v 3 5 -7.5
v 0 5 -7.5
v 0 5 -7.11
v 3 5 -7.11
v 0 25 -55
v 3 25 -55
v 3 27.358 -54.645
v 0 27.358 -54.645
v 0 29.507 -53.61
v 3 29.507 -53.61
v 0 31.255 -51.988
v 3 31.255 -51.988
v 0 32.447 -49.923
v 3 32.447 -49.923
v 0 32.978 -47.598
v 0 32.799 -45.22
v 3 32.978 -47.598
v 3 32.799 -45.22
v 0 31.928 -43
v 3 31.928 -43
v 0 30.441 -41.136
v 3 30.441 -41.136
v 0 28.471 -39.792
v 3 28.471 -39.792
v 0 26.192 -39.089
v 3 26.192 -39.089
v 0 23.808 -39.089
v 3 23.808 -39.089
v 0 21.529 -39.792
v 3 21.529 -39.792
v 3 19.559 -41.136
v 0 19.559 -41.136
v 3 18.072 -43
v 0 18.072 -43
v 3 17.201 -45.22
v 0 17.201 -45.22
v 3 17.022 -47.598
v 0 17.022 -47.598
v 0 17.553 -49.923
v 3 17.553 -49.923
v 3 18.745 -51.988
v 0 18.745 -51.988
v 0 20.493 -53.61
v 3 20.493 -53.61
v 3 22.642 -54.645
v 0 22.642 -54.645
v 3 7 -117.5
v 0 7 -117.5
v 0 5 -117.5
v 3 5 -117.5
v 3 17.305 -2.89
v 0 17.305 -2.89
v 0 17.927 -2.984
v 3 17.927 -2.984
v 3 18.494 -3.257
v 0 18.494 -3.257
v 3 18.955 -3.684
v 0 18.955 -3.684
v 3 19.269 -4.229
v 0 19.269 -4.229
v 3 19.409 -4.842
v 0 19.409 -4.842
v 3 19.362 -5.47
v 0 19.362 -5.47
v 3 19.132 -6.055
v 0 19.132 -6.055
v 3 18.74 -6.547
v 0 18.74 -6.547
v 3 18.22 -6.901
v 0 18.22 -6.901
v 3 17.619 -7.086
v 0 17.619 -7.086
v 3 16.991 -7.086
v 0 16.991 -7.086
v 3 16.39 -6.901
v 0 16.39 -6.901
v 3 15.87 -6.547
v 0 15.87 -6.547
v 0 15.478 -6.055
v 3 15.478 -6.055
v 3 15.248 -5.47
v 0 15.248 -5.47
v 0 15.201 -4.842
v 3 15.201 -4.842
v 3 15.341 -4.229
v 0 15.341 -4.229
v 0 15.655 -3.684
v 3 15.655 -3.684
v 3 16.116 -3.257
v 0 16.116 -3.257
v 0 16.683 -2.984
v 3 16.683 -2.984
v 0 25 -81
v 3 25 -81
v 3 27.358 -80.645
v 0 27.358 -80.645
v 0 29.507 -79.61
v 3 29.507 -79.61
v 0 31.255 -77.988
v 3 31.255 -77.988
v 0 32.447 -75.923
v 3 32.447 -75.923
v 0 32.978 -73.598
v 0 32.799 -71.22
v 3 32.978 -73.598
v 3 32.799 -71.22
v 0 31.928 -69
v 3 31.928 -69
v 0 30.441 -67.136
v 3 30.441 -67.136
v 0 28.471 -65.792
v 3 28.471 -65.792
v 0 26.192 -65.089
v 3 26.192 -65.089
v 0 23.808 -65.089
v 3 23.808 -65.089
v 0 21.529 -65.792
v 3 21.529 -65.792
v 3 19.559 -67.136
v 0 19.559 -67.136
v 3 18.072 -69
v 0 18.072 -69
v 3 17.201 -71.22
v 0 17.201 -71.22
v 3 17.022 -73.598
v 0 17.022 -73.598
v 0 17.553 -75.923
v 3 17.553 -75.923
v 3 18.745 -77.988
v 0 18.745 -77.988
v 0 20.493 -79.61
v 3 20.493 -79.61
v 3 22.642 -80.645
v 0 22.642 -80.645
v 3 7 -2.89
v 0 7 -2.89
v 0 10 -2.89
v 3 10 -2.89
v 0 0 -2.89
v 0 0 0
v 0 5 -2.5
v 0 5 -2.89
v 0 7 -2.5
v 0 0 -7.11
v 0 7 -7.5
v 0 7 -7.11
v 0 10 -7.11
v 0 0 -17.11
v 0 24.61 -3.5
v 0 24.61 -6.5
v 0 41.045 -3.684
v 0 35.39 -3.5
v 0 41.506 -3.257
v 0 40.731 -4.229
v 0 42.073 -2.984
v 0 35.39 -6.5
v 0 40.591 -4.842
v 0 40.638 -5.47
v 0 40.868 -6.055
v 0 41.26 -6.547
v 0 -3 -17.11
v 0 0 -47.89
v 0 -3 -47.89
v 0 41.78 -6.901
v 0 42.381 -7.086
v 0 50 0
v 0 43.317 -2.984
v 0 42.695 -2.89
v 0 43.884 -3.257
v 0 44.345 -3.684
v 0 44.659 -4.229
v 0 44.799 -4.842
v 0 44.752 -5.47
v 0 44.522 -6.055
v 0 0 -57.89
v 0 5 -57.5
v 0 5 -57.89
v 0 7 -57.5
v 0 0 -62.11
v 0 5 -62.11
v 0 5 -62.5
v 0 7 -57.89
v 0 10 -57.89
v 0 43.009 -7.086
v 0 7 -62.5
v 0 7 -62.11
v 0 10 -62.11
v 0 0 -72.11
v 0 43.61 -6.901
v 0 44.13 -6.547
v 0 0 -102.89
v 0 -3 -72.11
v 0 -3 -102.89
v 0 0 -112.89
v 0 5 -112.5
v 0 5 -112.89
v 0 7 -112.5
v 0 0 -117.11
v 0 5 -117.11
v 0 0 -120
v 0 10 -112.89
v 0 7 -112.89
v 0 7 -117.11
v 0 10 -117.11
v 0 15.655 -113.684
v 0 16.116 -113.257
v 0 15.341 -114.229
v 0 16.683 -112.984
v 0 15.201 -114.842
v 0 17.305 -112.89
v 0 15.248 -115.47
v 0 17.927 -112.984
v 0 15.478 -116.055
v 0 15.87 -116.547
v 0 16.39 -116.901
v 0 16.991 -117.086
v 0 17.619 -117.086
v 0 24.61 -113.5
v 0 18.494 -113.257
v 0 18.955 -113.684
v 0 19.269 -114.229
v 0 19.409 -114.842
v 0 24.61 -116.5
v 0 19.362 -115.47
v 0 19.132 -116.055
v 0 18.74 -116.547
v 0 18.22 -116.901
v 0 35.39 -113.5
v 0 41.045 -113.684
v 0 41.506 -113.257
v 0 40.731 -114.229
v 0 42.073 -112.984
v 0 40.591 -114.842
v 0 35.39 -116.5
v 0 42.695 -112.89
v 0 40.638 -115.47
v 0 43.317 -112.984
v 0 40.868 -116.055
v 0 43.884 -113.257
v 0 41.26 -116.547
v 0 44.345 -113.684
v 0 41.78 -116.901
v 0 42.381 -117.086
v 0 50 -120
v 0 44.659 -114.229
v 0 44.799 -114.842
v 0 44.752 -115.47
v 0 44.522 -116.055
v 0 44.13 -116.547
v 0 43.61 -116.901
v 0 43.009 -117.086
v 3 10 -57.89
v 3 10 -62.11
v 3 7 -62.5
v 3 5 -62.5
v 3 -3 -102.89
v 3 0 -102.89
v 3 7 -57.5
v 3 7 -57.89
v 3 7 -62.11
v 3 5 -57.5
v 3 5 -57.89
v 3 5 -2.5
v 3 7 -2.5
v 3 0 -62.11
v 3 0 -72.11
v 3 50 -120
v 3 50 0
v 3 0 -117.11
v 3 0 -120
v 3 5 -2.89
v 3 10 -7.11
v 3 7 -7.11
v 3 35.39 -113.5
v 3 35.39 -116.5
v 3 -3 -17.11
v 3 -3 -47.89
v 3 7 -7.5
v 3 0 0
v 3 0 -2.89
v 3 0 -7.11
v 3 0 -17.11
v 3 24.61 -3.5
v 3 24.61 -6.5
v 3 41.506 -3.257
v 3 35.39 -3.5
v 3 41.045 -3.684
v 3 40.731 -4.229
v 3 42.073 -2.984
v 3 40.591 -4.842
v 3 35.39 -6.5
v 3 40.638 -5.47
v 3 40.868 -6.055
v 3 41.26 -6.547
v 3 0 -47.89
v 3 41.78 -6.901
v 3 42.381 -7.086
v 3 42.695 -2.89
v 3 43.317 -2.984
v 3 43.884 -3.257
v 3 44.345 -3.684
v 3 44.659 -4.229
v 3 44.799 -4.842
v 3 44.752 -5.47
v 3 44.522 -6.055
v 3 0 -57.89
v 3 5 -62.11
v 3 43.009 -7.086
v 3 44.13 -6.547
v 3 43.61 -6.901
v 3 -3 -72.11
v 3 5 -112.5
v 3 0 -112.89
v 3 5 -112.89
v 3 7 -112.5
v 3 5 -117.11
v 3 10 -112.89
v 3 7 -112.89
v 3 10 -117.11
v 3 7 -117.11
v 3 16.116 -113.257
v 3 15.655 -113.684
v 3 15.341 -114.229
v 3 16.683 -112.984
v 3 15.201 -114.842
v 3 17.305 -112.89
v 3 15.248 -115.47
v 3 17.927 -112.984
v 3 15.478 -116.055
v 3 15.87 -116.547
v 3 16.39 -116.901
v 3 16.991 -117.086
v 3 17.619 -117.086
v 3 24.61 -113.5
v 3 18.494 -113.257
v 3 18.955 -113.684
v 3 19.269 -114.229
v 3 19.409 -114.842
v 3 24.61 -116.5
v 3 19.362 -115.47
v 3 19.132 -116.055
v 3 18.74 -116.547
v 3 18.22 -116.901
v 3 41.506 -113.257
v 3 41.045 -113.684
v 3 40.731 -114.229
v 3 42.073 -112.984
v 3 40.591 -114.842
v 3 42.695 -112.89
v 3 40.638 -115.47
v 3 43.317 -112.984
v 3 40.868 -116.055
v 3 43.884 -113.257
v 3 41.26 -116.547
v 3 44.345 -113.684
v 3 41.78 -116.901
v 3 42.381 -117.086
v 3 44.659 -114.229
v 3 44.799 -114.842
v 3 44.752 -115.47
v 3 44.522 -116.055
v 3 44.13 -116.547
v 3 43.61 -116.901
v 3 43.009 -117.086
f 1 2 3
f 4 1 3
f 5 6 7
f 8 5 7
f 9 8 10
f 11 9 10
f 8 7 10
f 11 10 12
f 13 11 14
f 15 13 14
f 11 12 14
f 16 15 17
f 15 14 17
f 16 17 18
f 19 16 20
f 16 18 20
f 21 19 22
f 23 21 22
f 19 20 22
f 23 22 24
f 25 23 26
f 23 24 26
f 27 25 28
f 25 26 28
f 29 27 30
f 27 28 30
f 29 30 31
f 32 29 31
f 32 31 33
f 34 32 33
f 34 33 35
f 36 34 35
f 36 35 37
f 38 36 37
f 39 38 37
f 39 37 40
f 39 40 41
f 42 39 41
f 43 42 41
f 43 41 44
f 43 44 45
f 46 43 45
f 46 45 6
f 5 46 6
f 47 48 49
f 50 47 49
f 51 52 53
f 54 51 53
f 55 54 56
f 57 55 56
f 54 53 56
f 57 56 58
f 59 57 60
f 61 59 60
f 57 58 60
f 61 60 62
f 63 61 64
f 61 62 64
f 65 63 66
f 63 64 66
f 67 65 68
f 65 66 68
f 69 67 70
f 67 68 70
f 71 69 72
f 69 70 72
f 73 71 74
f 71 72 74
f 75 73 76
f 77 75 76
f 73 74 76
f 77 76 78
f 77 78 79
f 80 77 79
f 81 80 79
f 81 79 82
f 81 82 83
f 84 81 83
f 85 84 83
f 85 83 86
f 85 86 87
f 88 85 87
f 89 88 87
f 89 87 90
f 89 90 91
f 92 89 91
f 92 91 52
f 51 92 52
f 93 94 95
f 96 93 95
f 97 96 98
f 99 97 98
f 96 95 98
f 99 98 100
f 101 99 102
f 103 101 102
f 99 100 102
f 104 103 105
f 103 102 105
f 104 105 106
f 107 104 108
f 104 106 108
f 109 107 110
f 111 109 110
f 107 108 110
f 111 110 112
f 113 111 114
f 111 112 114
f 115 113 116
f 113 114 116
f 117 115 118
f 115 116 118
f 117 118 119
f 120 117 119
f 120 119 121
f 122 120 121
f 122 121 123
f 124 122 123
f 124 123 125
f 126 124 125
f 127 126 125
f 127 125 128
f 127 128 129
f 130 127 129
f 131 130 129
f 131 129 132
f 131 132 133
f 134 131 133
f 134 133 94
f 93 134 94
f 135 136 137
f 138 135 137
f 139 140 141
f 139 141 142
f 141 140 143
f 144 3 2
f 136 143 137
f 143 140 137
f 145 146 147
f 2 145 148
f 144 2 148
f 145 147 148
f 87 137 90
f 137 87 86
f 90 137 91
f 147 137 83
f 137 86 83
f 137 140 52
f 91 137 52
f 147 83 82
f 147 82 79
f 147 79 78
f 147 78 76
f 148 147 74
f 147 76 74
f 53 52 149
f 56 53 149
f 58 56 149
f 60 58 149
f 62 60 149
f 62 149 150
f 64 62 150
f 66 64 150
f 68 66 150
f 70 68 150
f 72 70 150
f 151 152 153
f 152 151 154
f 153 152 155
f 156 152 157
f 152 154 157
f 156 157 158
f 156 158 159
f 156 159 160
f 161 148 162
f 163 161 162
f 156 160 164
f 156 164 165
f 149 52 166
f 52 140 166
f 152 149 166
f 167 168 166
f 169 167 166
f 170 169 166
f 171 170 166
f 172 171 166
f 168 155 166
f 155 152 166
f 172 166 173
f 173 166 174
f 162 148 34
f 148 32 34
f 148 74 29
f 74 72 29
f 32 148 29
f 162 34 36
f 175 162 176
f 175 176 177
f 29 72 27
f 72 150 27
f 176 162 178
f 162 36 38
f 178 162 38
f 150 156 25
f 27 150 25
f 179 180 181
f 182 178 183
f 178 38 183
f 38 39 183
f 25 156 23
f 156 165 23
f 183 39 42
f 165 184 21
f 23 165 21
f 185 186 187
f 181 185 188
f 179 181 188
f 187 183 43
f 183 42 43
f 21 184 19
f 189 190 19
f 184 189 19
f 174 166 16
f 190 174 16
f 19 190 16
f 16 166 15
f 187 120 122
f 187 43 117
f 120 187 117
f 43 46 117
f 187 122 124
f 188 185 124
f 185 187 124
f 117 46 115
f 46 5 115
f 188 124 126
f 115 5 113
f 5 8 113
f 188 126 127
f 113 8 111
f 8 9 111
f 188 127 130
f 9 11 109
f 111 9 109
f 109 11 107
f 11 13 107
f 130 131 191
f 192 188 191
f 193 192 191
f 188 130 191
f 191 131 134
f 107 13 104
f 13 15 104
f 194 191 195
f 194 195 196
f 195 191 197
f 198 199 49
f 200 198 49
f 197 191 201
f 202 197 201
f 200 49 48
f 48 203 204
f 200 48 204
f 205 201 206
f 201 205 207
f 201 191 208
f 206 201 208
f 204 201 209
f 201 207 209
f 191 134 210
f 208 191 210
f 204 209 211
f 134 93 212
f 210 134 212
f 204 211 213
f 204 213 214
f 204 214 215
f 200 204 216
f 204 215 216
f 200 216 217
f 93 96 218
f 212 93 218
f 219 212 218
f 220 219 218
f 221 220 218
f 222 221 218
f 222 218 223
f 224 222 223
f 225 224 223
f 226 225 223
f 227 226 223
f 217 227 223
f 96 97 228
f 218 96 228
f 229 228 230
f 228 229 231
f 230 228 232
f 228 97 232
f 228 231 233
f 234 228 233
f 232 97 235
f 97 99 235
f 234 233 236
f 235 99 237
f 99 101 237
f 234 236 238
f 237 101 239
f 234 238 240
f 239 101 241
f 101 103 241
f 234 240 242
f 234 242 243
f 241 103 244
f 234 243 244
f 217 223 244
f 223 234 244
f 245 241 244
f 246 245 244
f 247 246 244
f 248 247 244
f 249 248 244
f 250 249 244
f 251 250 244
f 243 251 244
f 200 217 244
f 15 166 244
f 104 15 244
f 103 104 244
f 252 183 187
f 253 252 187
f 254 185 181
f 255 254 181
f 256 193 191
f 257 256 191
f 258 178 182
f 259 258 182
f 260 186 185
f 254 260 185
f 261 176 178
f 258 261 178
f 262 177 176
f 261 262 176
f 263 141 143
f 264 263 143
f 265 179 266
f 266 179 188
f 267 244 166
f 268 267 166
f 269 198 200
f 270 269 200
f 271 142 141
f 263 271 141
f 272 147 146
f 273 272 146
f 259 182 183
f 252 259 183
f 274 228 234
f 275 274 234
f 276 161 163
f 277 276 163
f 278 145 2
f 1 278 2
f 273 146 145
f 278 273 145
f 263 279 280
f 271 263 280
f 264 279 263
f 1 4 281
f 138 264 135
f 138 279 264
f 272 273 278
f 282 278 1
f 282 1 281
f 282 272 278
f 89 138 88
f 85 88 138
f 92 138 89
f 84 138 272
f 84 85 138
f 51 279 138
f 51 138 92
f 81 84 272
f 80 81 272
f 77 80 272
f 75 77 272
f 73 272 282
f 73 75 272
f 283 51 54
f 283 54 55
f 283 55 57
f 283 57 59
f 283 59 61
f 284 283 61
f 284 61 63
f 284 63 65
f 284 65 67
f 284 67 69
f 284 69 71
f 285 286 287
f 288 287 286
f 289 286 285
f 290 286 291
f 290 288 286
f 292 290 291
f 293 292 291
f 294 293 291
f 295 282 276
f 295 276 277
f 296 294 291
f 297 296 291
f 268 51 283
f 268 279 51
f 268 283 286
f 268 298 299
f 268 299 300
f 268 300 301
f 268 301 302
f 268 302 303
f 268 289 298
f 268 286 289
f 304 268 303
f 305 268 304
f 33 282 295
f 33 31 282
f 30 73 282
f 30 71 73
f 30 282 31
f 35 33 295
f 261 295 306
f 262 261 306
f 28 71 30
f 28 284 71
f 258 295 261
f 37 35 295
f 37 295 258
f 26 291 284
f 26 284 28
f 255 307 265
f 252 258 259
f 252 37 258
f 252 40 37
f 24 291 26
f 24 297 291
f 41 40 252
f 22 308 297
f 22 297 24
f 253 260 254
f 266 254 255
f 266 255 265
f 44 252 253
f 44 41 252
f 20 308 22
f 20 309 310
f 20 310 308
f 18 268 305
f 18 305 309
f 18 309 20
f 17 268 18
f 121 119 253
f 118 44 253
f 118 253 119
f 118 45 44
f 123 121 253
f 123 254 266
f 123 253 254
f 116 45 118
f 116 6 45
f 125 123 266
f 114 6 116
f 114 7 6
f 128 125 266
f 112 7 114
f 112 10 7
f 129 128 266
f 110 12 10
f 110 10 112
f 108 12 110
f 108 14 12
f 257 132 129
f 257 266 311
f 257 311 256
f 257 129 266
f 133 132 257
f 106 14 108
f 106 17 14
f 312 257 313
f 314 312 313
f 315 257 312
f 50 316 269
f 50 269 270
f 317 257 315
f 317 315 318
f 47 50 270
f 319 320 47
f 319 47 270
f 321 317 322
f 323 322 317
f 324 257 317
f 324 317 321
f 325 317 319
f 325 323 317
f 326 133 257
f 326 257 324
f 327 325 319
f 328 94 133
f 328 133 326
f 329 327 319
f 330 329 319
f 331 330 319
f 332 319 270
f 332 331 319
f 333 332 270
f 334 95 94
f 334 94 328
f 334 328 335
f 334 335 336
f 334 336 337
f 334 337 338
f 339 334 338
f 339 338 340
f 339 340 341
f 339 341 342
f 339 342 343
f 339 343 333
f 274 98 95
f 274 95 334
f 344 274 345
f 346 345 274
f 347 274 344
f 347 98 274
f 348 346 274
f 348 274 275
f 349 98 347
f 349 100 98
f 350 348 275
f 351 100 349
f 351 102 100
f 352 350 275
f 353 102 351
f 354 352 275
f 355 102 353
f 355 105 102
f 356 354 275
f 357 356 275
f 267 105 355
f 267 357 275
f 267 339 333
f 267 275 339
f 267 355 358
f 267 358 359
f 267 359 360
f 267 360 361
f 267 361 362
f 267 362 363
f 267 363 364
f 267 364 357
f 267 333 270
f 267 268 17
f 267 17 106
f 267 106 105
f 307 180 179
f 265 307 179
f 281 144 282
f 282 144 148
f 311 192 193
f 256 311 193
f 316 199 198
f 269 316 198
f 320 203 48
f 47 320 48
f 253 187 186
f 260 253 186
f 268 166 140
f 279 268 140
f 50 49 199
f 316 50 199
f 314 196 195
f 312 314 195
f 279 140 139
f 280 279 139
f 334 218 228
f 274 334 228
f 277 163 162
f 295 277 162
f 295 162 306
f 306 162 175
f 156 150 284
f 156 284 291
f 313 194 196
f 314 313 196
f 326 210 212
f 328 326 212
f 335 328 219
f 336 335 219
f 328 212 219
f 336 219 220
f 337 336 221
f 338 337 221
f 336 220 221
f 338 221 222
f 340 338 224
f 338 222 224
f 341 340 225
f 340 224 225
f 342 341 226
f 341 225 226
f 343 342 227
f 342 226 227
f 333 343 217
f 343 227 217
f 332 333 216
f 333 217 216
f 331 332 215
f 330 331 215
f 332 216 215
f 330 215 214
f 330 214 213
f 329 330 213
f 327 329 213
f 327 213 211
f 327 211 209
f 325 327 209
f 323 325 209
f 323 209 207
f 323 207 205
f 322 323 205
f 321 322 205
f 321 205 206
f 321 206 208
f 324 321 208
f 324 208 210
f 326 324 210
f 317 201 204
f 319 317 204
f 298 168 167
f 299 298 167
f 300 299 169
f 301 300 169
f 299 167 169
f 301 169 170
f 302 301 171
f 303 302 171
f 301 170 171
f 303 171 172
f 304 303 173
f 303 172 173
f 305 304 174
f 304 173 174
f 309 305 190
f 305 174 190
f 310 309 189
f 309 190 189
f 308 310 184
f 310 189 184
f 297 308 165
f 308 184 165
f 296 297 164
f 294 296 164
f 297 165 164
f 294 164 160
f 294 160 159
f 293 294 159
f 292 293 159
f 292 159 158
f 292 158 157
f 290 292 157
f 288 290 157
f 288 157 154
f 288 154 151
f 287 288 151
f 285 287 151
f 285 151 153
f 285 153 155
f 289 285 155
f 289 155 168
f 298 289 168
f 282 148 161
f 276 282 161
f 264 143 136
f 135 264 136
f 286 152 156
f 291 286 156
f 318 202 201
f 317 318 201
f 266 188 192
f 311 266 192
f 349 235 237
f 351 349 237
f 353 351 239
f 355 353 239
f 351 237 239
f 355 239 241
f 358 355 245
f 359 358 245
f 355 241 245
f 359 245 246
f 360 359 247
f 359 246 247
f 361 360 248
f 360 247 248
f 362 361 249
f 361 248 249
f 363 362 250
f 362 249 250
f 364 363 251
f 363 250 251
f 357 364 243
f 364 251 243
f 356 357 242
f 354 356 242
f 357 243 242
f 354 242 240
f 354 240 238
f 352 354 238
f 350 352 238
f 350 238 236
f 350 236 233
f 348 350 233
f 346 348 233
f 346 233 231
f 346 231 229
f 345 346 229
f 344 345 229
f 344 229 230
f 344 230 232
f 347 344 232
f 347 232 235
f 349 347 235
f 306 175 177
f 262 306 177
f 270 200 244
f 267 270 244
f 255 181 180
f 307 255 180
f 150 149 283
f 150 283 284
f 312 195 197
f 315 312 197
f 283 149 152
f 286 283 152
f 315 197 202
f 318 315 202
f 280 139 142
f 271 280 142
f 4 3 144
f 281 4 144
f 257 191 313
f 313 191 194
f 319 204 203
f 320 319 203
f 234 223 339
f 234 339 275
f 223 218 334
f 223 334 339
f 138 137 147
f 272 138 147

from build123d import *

# Parameters (mm, degrees)
SKETCH2_W                      = 3
SKETCH2_H                      = 10.78
BOSS_EXTRUDE2_DEPTH            = 3
HOLE_FOR_M3_300_SC_NUTS_SP_1_D = 4.22
SKETCH10_R                     = 8
CUT_EXTRUDE1_DEPTH             = 10


with BuildPart() as part:
    # Sketch2 → Boss-Extrude2 (new body)
    with BuildSketch(Plane(origin=(0, 0, 0), x_dir=(0, 0, -1), z_dir=(1, 0, 0))):
        Polygon((0, 0), (2.89, 0), (2.89, 5), (2.5, 5), (2.5, 7), (2.89, 7), (2.89, 10), (7.11, 10), (7.11, 7), (7.5, 7), (7.5, 5), (7.11, 5), (7.11, 0), (17.11, 0), (17.11, -3), (47.89, -3), (47.89, 0), (57.89, 0), (57.89, 5), (57.5, 5), (57.5, 7), (57.89, 7), (57.89, 10), (62.11, 10), (62.11, 7), (62.5, 7), (62.5, 5), (62.11, 5), (62.11, 0), (72.11, 0), (72.11, -3), (102.89, -3), (102.89, 0), (112.89, 0), (112.89, 5), (112.5, 5), (112.5, 7), (112.89, 7), (112.89, 10), (117.11, 10), (117.11, 7), (117.5, 7), (117.5, 5), (117.11, 5), (117.11, 0), (120, 0), (120, 50), (0, 50), align=None)
        with Locations((115, 30)):
            Rectangle(SKETCH2_W, SKETCH2_H, mode=Mode.SUBTRACT)
        with Locations((5, 30)):
            Rectangle(SKETCH2_W, SKETCH2_H, mode=Mode.SUBTRACT)
    extrude(amount=BOSS_EXTRUDE2_DEPTH)

    # Hole for M3 300® SC Nuts (SP)1 (through all)
    with Locations(Plane(origin=(3, 0, 0), x_dir=(0, 0, -1), z_dir=(1, 0, 0))):
        with Locations((5, 42.695), (5, 17.305), (115, 42.695), (115, 17.305)):
            Hole(HOLE_FOR_M3_300_SC_NUTS_SP_1_D / 2)

    # Sketch10 → Cut-Extrude1 (cut)
    with BuildSketch(Plane(origin=(3, 0, 0), x_dir=(0, 0, -1), z_dir=(1, 0, 0))):
        with Locations((73, 25)):
            Circle(SKETCH10_R)
        with Locations((47, 25)):
            Circle(SKETCH10_R)
    extrude(amount=-CUT_EXTRUDE1_DEPTH, mode=Mode.SUBTRACT)


solid = part.part
